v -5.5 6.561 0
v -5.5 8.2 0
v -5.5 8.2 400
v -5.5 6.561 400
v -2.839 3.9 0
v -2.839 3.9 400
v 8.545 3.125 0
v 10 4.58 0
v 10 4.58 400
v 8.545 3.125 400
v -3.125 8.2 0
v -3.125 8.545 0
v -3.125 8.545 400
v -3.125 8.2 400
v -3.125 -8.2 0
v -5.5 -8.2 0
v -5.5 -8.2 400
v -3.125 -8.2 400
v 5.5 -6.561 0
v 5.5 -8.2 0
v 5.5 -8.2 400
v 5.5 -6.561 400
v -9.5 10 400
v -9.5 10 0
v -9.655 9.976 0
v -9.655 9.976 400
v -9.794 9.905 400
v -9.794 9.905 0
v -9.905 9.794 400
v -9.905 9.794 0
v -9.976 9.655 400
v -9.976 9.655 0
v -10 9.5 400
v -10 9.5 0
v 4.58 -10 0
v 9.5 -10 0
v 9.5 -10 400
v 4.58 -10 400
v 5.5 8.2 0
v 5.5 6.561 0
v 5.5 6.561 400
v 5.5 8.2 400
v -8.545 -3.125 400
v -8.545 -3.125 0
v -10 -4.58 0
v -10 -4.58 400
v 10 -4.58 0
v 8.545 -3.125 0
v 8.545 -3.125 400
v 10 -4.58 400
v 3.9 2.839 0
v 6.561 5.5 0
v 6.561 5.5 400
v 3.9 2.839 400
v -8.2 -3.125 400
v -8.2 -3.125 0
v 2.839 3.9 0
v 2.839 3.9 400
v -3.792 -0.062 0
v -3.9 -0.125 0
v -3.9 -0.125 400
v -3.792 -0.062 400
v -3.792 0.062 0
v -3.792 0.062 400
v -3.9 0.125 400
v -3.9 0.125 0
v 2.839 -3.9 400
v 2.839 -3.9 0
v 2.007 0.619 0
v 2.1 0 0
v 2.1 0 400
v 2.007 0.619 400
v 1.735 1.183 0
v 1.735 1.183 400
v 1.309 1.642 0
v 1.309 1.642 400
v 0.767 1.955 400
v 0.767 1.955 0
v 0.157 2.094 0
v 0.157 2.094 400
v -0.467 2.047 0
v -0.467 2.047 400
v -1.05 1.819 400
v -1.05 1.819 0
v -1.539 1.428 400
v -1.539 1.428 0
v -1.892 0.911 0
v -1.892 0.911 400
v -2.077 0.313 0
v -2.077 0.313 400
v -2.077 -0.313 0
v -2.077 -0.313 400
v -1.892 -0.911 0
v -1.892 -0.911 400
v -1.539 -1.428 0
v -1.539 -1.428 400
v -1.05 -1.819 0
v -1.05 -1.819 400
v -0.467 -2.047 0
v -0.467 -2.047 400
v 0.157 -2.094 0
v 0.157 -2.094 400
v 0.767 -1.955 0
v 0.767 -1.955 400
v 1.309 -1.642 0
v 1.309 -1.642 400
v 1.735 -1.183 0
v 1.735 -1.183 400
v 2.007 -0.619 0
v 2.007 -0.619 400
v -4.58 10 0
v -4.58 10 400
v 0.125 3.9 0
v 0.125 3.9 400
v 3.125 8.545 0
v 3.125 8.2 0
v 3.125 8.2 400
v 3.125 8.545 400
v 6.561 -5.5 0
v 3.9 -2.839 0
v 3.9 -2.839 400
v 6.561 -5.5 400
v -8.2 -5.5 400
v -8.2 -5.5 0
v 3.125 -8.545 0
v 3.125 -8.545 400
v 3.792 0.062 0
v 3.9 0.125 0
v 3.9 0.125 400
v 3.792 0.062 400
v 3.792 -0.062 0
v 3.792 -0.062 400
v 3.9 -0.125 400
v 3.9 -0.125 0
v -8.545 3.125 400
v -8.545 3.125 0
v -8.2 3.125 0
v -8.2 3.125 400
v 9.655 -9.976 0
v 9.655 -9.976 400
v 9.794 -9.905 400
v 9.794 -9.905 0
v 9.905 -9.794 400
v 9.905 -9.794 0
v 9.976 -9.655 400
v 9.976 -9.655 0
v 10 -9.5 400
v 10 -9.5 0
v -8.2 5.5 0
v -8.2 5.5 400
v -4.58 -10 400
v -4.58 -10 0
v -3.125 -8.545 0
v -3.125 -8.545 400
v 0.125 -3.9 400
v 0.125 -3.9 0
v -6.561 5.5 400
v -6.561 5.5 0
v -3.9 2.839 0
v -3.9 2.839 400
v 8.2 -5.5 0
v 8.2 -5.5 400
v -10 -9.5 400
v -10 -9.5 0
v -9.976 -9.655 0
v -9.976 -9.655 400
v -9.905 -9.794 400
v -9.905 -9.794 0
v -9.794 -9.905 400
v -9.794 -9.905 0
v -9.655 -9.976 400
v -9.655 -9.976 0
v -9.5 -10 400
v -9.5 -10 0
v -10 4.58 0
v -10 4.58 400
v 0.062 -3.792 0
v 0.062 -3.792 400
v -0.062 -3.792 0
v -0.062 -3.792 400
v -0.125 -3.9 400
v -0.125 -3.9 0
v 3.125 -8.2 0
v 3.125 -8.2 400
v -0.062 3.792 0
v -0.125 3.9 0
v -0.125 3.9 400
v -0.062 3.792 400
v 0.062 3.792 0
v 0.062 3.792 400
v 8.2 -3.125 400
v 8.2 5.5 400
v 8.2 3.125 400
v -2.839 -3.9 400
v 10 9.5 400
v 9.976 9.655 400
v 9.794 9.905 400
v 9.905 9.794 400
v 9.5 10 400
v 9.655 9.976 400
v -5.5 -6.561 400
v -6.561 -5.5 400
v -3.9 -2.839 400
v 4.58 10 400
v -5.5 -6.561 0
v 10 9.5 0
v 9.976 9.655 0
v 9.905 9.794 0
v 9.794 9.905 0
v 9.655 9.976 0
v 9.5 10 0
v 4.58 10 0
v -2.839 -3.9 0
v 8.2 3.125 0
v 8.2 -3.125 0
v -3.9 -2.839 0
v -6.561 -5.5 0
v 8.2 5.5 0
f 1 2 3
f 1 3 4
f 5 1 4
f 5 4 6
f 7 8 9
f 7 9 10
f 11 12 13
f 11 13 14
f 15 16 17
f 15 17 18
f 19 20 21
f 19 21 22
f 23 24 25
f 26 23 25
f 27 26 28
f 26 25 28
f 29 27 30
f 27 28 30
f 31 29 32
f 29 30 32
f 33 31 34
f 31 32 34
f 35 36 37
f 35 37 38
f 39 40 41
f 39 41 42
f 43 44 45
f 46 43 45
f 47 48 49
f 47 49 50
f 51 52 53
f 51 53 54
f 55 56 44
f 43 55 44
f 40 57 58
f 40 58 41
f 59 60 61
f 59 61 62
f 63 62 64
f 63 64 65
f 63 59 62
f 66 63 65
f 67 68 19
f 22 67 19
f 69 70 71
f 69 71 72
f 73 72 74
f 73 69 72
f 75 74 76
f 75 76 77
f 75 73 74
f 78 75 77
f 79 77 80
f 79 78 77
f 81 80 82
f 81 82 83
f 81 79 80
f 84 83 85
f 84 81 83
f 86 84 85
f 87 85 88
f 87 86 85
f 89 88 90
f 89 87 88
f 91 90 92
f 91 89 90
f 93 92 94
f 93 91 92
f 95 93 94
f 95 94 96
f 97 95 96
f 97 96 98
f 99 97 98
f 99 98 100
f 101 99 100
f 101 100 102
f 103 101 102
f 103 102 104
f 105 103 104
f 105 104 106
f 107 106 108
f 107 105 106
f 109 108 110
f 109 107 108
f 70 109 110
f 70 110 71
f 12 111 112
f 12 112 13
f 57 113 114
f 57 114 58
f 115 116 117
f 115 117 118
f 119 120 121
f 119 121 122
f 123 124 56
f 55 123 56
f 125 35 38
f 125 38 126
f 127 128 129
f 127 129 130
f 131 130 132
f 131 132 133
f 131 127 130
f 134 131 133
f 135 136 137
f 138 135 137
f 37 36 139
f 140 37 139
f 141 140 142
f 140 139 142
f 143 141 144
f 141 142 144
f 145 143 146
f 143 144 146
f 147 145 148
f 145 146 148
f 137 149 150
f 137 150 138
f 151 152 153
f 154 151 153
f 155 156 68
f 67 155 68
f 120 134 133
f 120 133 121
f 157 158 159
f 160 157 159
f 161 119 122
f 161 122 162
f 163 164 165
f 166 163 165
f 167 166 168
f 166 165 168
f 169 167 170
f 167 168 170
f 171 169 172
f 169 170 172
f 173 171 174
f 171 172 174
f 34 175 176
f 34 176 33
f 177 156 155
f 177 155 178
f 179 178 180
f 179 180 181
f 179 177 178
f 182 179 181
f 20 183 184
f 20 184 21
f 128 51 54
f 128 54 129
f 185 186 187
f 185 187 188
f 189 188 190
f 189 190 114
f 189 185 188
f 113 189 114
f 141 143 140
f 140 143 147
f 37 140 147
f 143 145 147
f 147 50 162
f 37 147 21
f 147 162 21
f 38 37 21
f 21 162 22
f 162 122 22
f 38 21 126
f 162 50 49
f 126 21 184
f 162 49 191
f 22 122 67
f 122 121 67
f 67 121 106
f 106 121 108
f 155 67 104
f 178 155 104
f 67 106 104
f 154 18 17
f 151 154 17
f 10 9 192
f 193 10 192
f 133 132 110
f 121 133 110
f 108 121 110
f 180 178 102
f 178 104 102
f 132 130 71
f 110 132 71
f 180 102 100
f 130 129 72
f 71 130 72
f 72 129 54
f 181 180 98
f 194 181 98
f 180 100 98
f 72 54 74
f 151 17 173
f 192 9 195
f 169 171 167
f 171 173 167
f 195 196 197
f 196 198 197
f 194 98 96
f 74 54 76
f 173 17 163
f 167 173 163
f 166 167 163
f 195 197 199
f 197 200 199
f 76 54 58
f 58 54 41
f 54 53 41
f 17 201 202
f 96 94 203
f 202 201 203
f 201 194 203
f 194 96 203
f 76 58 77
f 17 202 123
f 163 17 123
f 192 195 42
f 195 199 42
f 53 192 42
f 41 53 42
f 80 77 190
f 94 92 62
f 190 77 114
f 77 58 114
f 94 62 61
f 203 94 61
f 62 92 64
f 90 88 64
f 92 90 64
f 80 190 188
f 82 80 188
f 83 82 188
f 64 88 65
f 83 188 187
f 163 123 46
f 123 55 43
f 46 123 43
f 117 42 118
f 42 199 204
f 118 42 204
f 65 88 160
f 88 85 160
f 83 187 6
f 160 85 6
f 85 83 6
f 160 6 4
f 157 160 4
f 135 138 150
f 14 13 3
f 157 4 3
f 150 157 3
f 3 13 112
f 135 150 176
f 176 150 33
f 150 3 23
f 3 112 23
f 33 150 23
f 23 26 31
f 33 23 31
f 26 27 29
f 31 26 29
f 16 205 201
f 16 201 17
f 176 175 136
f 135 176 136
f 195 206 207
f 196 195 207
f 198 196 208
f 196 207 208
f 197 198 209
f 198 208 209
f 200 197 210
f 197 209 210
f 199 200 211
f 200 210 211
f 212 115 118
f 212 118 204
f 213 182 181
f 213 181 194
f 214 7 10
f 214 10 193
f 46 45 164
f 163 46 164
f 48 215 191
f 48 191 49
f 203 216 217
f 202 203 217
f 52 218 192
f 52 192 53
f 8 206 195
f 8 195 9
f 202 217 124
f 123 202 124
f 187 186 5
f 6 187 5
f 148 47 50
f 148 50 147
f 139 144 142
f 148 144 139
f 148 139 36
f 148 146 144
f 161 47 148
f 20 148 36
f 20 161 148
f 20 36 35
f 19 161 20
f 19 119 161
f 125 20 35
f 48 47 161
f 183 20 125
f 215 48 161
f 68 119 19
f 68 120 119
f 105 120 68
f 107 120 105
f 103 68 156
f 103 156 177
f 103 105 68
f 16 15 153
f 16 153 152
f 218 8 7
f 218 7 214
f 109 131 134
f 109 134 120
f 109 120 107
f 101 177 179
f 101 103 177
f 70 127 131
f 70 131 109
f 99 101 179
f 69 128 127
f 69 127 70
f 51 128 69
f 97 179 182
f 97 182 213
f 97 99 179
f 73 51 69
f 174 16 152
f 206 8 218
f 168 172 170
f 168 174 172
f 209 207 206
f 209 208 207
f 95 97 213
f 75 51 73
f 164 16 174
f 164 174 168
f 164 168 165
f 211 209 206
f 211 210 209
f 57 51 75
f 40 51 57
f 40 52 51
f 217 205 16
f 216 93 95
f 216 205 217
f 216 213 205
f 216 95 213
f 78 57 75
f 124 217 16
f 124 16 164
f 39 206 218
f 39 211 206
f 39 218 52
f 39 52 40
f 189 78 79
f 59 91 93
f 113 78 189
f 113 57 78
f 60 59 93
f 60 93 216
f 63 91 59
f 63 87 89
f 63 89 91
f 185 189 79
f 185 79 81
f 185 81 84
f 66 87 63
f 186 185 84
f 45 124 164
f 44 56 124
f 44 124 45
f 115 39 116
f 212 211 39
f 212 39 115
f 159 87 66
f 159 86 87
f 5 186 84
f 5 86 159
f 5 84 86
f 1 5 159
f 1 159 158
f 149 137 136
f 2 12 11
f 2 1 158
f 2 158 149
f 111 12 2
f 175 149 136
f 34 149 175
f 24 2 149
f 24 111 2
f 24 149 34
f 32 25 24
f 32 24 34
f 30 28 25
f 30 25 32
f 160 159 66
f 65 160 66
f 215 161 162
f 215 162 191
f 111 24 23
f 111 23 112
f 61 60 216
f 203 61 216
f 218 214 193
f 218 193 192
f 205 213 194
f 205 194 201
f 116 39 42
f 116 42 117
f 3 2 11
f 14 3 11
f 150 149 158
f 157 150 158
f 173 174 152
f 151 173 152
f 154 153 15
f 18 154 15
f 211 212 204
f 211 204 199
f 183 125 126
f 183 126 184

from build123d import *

# Parameters (mm, degrees)
SKETCH_R  = 2.1
PAD_DEPTH = 400


with BuildPart() as part:
    # Sketch → Pad (new body)
    with BuildSketch(Plane.XY):
        with BuildLine():
            Line((-10, 4.58), (-10, 9.5))
            ThreePointArc((-9.5, 10), (-9.853553, 9.853553), (-10, 9.5))
            Line((-9.5, 10), (-4.58, 10))
            Line((-4.58, 10), (-3.125, 8.545))
            Line((-3.125, 8.545), (-3.125, 8.2))
            Line((-5.5, 8.2), (-3.125, 8.2))
            Line((-5.5, 8.2), (-5.5, 6.56066))
            Line((-5.5, 6.56066), (-2.83934, 3.9))
            Line((-0.125, 3.9), (-2.83934, 3.9))
            ThreePointArc((-0.125, 3.9), (0, 3.775), (0.125, 3.9))
            Line((0.125, 3.9), (2.83934, 3.9))
            Line((2.83934, 3.9), (5.5, 6.56066))
            Line((5.5, 6.56066), (5.5, 8.2))
            Line((5.5, 8.2), (3.125, 8.2))
            Line((3.125, 8.2), (3.125, 8.545))
            Line((3.125, 8.545), (4.58, 10))
            Line((4.58, 10), (9.5, 10))
            ThreePointArc((10, 9.5), (9.853553, 9.853553), (9.5, 10))
            Line((10, 9.5), (10, 4.58))
            Line((10, 4.58), (8.545, 3.125))
            Line((8.545, 3.125), (8.2, 3.125))
            Line((8.2, 3.125), (8.2, 5.5))
            Line((8.2, 5.5), (6.56066, 5.5))
            Line((6.56066, 5.5), (3.9, 2.83934))
            Line((3.9, 2.83934), (3.9, 0.125))
            ThreePointArc((3.9, 0.125), (3.775, 0), (3.9, -0.125))
            Line((3.9, -0.125), (3.9, -2.83934))
            Line((3.9, -2.83934), (6.56066, -5.5))
            Line((6.56066, -5.5), (8.2, -5.5))
            Line((8.2, -5.5), (8.2, -3.125))
            Line((8.2, -3.125), (8.545, -3.125))
            Line((8.545, -3.125), (10, -4.58))
            Line((10, -4.58), (10, -9.5))
            ThreePointArc((9.5, -10), (9.853553, -9.853553), (10, -9.5))
            Line((9.5, -10), (4.58, -10))
            Line((4.58, -10), (3.125, -8.545))
            Line((3.125, -8.545), (3.125, -8.2))
            Line((3.125, -8.2), (5.5, -8.2))
            Line((5.5, -8.2), (5.5, -6.56066))
            Line((2.83934, -3.9), (5.5, -6.56066))
            Line((0.125, -3.9), (2.83934, -3.9))
            ThreePointArc((0.125, -3.9), (0, -3.775), (-0.125, -3.9))
            Line((-0.125, -3.9), (-2.83934, -3.9))
            Line((-2.83934, -3.9), (-5.5, -6.56066))
            Line((-5.5, -6.56066), (-5.5, -8.2))
            Line((-5.5, -8.2), (-3.125, -8.2))
            Line((-3.125, -8.545), (-3.125, -8.2))
            Line((-4.58, -10), (-3.125, -8.545))
            Line((-9.5, -10), (-4.58, -10))
            ThreePointArc((-10, -9.5), (-9.853553, -9.853553), (-9.5, -10))
            Line((-10, -4.58), (-10, -9.5))
            Line((-8.545, -3.125), (-10, -4.58))
            Line((-8.2, -3.125), (-8.545, -3.125))
            Line((-8.2, -5.5), (-8.2, -3.125))
            Line((-6.56066, -5.5), (-8.2, -5.5))
            Line((-3.9, -2.83934), (-6.56066, -5.5))
            Line((-3.9, -0.125), (-3.9, -2.83934))
            ThreePointArc((-3.9, -0.125), (-3.775, 0), (-3.9, 0.125))
            Line((-3.9, 2.83934), (-3.9, 0.125))
            Line((-6.56066, 5.5), (-3.9, 2.83934))
            Line((-8.2, 5.5), (-6.56066, 5.5))
            Line((-8.2, 5.5), (-8.2, 3.125))
            Line((-8.545, 3.125), (-8.2, 3.125))
            Line((-10, 4.58), (-8.545, 3.125))
        make_face()
        Circle(SKETCH_R, mode=Mode.SUBTRACT)
    extrude(amount=PAD_DEPTH)


solid = part.part
